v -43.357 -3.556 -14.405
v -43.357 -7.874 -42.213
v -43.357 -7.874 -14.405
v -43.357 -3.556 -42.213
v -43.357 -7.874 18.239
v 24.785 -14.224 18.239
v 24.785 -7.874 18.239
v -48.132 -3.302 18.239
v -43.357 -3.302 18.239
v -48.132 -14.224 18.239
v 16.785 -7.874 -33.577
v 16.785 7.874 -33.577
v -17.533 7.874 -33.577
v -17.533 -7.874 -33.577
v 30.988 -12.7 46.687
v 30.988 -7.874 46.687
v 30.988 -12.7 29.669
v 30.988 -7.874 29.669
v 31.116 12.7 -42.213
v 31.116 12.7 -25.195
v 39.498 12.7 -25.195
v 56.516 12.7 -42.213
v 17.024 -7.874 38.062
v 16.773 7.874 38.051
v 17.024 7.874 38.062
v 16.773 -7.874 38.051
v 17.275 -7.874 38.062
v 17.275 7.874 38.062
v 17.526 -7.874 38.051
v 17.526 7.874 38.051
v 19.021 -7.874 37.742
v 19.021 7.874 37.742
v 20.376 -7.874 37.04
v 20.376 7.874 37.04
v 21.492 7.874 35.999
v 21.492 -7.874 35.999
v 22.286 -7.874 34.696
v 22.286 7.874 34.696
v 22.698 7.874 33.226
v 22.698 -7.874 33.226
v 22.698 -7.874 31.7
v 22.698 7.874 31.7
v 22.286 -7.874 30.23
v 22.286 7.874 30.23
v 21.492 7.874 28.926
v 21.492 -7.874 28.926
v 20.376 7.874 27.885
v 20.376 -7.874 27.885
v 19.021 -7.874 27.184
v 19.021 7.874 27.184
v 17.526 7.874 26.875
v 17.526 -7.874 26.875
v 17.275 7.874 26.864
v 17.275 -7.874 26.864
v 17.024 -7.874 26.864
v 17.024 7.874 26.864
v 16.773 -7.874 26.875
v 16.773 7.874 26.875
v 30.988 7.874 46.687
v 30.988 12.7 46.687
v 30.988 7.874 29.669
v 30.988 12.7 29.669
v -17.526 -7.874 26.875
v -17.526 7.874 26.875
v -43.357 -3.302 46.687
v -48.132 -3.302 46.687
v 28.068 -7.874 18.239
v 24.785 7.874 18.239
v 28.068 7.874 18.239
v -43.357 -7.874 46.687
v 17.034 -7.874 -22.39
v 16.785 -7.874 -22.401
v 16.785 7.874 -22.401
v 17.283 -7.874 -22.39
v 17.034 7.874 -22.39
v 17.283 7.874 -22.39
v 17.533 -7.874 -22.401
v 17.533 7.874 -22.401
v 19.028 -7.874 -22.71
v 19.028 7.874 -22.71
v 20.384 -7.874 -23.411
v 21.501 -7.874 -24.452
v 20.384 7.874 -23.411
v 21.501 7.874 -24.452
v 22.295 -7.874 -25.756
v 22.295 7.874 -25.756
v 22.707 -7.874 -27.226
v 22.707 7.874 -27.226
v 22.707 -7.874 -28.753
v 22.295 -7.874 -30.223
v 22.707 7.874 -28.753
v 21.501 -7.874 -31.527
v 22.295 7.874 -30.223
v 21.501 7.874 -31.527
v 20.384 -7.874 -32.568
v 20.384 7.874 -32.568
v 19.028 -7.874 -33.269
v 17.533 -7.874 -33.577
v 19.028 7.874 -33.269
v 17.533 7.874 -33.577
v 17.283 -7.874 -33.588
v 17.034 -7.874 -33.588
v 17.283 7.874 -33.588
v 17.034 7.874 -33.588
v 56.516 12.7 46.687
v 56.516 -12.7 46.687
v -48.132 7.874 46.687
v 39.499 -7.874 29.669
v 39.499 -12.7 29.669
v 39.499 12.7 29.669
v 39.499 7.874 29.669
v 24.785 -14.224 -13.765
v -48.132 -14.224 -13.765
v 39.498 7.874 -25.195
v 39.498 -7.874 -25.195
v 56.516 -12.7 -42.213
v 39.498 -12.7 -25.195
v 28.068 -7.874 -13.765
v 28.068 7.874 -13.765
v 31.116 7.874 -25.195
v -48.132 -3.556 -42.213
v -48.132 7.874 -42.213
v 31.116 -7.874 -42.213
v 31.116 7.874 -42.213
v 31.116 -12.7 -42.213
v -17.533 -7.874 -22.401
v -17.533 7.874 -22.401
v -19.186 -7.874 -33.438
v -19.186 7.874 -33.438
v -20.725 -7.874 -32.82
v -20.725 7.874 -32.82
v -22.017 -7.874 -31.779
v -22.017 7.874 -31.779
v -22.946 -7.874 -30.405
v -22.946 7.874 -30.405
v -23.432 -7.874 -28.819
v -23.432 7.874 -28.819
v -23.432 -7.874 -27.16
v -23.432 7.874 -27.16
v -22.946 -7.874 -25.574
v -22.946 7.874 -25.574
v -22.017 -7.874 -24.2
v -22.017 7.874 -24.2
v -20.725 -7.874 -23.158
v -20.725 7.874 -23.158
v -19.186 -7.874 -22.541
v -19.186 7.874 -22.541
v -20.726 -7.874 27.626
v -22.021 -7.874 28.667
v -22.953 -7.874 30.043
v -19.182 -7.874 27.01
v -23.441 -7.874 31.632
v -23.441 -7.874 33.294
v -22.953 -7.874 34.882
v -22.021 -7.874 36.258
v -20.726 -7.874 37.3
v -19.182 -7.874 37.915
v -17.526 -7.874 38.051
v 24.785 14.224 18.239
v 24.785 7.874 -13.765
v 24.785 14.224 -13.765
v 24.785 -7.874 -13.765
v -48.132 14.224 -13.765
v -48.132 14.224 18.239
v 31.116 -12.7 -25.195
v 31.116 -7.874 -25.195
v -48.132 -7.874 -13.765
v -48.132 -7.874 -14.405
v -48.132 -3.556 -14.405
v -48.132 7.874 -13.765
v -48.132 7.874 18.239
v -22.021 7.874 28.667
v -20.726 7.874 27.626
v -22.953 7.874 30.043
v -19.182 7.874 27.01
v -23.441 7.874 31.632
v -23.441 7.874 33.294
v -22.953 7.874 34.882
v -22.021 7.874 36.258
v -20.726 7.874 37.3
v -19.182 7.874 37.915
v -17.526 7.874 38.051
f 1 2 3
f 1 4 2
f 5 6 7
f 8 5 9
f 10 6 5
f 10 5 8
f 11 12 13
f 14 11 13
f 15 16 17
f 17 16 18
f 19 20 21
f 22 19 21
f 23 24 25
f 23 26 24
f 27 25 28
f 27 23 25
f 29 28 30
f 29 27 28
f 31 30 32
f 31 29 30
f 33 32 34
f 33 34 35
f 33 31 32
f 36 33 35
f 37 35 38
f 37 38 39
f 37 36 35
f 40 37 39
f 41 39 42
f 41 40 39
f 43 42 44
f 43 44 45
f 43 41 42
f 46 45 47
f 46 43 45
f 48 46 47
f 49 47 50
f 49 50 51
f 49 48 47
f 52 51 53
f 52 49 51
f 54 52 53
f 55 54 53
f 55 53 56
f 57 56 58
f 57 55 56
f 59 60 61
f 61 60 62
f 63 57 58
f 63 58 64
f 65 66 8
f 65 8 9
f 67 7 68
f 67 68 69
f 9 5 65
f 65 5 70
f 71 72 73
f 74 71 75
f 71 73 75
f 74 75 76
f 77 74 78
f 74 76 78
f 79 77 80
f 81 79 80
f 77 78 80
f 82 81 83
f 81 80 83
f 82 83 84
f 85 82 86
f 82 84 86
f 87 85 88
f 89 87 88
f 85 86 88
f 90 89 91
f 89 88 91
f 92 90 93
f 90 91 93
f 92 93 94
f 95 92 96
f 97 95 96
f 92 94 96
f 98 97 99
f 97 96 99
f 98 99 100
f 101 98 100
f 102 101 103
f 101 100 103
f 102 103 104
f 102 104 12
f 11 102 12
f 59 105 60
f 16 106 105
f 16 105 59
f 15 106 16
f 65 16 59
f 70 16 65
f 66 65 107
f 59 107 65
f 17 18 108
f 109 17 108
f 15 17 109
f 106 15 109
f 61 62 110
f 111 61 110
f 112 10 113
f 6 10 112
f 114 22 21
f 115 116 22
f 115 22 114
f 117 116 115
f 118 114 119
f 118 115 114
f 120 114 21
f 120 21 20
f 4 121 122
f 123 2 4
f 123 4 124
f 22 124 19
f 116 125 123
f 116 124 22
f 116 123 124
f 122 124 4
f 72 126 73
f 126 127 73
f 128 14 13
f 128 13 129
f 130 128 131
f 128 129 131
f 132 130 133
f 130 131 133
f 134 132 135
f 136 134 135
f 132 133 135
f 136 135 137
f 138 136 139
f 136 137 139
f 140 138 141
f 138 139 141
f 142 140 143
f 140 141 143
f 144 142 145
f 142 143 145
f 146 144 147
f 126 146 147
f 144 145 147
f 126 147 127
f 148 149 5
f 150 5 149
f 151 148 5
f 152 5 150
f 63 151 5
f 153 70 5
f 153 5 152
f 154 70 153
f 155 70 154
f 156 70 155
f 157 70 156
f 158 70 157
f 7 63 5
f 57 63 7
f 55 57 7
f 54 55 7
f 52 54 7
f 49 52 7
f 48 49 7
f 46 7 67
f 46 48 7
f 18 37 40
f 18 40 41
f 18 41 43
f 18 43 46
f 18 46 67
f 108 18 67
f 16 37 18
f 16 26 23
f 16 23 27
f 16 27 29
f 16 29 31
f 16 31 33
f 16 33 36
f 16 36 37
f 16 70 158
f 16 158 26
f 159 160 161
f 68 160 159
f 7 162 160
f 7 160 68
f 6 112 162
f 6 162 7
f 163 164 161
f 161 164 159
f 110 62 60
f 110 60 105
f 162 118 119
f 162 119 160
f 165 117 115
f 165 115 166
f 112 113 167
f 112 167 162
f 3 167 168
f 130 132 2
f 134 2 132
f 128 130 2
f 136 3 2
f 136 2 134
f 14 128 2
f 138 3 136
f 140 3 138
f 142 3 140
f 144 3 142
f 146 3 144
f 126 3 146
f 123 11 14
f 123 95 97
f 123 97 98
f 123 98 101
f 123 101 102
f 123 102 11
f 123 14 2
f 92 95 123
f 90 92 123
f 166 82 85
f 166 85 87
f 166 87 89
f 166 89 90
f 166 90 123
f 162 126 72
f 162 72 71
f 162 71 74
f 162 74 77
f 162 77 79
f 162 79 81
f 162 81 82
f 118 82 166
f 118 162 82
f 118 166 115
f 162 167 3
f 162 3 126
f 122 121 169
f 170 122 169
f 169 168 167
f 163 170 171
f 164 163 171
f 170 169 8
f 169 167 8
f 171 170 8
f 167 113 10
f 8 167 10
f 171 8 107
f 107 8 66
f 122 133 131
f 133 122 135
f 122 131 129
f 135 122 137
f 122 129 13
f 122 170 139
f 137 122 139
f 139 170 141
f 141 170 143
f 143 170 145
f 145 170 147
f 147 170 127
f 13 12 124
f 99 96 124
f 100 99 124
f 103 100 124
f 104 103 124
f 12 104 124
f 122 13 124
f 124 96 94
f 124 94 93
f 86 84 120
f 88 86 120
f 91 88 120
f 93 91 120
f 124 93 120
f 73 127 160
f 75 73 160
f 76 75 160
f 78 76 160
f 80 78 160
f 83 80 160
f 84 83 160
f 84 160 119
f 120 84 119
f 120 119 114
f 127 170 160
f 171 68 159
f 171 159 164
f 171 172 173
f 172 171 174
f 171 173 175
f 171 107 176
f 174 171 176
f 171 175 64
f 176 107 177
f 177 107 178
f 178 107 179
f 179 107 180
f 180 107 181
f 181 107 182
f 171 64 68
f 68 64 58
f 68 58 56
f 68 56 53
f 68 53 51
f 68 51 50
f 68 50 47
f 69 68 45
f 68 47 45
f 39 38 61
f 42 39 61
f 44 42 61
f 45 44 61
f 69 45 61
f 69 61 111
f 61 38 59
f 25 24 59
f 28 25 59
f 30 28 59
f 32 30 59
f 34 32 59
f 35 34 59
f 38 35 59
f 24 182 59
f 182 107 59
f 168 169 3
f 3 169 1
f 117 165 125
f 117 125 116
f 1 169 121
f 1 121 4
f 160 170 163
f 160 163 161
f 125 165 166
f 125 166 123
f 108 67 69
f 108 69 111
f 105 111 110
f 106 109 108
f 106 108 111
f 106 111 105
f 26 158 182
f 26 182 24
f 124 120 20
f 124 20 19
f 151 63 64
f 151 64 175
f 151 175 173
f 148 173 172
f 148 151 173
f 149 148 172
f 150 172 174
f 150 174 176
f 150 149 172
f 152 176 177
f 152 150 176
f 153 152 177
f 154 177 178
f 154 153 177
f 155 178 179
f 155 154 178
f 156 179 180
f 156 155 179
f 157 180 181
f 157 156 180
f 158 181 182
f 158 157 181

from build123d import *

# Parameters (mm, degrees)
F1_DEPTH = 14.224
F0_W     = 6.35
F0_H     = 28.448
F2_DEPTH = 7.874
F3_DEPTH = 7.874
F4_DEPTH = 12.7
F5_W     = 4.7752308284
F5_H     = 28.448
F6_DEPTH = 4.572
F5_W_2   = 7.701497525
F5_H_2   = 30.8059919626
F7_DEPTH = 4.318


with BuildPart() as f1:
    # F0 (on Front) → F1 (new body, symmetric)
    with BuildSketch(Plane.XZ):
        Polygon((-41.7818096255, 18.2387964344), (-48.1318096255, 18.2387964344), (-48.1318096255, -13.7652035656), (-41.7818096255, -13.7652035656), (24.7846730053, -13.7652035656), (24.7846730053, 18.2387964344), align=None)
    extrude(amount=F1_DEPTH, both=True)

    # F0 (on Front) → F2 (join, symmetric)
    with BuildSketch(Plane.XZ):
        Polygon((24.7846730053, -13.7652035656), (-41.7818096255, -13.7652035656), (-41.7818096255, -42.2132035656), (31.1161903745, -42.2132035656), (31.1161903745, -25.1952035656), (39.4981903745, -25.1952035656), (28.0681903745, -13.7652035656), align=None)
        with BuildLine():
            ThreePointArc((-17.5326519589, -33.5772035656), (-23.4938096255, -27.9892035656), (-17.5326519589, -22.4012035656))
            Line((-17.5326519589, -22.4012035656), (16.7847272865, -22.4012035656))
            ThreePointArc((16.7847272865, -22.4012035656), (17.1586896227, -22.3887043175), (17.5326519589, -22.4012035656))
            ThreePointArc((17.5326519589, -22.4012035656), (22.7591888709, -27.9892035656), (17.5326519589, -33.5772035656))
            ThreePointArc((17.5326519589, -33.5772035656), (17.1586896227, -33.5897028138), (16.7847272865, -33.5772035656))
            Line((16.7847272865, -33.5772035656), (-17.5326519589, -33.5772035656))
        make_face(mode=Mode.SUBTRACT)
        Polygon((30.988478276, 46.6867964344), (-41.7818096255, 46.6867964344), (-41.7818096255, 18.2387964344), (24.7846730053, 18.2387964344), (28.0681903745, 18.2387964344), (39.4986695909, 29.6692756508), (30.988478276, 29.6692756508), align=None)
        with BuildLine():
            ThreePointArc((17.526, 38.0507964344), (22.7502411118, 32.4627964344), (17.526, 26.8747964344))
            ThreePointArc((17.526, 26.8747964344), (17.1495770209, 26.8621323434), (16.7731540417, 26.8747964344))
            Line((16.7731540417, 26.8747964344), (-17.526, 26.8747964344))
            ThreePointArc((-17.526, 26.8747964344), (-23.50308707, 32.4627964344), (-17.526, 38.0507964344))
            Line((-17.526, 38.0507964344), (16.7731540417, 38.0507964344))
            ThreePointArc((16.7731540417, 38.0507964344), (17.1495770209, 38.0634605253), (17.526, 38.0507964344))
        make_face(mode=Mode.SUBTRACT)
        with Locations((-44.9568096255, 32.4627964344)):
            Rectangle(F0_W, F0_H)
        with Locations((-44.9568096255, -27.9892035656)):
            Rectangle(F0_W, F0_H)
    extrude(amount=F2_DEPTH, both=True)

    # F0 (on Front) → F3 (join, symmetric)
    with BuildSketch(Plane.XZ):
        Polygon((30.988478276, 46.6867964344), (-41.7818096255, 46.6867964344), (-41.7818096255, 18.2387964344), (24.7846730053, 18.2387964344), (28.0681903745, 18.2387964344), (39.4986695909, 29.6692756508), (30.988478276, 29.6692756508), align=None)
        with BuildLine():
            ThreePointArc((17.526, 38.0507964344), (22.7502411118, 32.4627964344), (17.526, 26.8747964344))
            ThreePointArc((17.526, 26.8747964344), (17.1495770209, 26.8621323434), (16.7731540417, 26.8747964344))
            Line((16.7731540417, 26.8747964344), (-17.526, 26.8747964344))
            ThreePointArc((-17.526, 26.8747964344), (-23.50308707, 32.4627964344), (-17.526, 38.0507964344))
            Line((-17.526, 38.0507964344), (16.7731540417, 38.0507964344))
            ThreePointArc((16.7731540417, 38.0507964344), (17.1495770209, 38.0634605253), (17.526, 38.0507964344))
        make_face(mode=Mode.SUBTRACT)
        with Locations((-44.9568096255, 32.4627964344)):
            Rectangle(F0_W, F0_H)
        with Locations((-44.9568096255, -27.9892035656)):
            Rectangle(F0_W, F0_H)
        Polygon((24.7846730053, -13.7652035656), (-41.7818096255, -13.7652035656), (-41.7818096255, -42.2132035656), (31.1161903745, -42.2132035656), (31.1161903745, -25.1952035656), (39.4981903745, -25.1952035656), (28.0681903745, -13.7652035656), align=None)
        with BuildLine():
            ThreePointArc((-17.5326519589, -33.5772035656), (-23.4938096255, -27.9892035656), (-17.5326519589, -22.4012035656))
            Line((-17.5326519589, -22.4012035656), (16.7847272865, -22.4012035656))
            ThreePointArc((16.7847272865, -22.4012035656), (17.1586896227, -22.3887043175), (17.5326519589, -22.4012035656))
            ThreePointArc((17.5326519589, -22.4012035656), (22.7591888709, -27.9892035656), (17.5326519589, -33.5772035656))
            ThreePointArc((17.5326519589, -33.5772035656), (17.1586896227, -33.5897028138), (16.7847272865, -33.5772035656))
            Line((16.7847272865, -33.5772035656), (-17.5326519589, -33.5772035656))
        make_face(mode=Mode.SUBTRACT)
    extrude(amount=F3_DEPTH, both=True)

    # F0 (on Front) → F4 (join, symmetric)
    with BuildSketch(Plane.XZ):
        Polygon((56.5161903745, 46.6867964344), (30.988478276, 46.6867964344), (30.988478276, 29.6692756508), (39.4986695909, 29.6692756508), align=None)
        Polygon((31.1161903745, -25.1952035656), (31.1161903745, -42.2132035656), (56.5161903745, -42.2132035656), (39.4981903745, -25.1952035656), align=None)
    extrude(amount=F4_DEPTH, both=True)

    # F5 (on face) → F6 (cut, symmetric)
    with BuildSketch(Plane.XZ.offset(7.874)):
        with Locations((-45.7441942113, 32.4627964344)):
            Rectangle(F5_W, F5_H)
    extrude(amount=F6_DEPTH, both=True, mode=Mode.SUBTRACT)

    # F5 (on face) → F7 (cut, symmetric)
    with BuildSketch(Plane.XZ.offset(7.874)):
        with Locations((-47.2073275596, -29.8076486215)):
            Rectangle(F5_W_2, F5_H_2)
        with Locations((-45.7441942113, 32.4627964344)):
            Rectangle(F5_W, F5_H)
    extrude(amount=F7_DEPTH, both=True, mode=Mode.SUBTRACT)


solid = f1.part
